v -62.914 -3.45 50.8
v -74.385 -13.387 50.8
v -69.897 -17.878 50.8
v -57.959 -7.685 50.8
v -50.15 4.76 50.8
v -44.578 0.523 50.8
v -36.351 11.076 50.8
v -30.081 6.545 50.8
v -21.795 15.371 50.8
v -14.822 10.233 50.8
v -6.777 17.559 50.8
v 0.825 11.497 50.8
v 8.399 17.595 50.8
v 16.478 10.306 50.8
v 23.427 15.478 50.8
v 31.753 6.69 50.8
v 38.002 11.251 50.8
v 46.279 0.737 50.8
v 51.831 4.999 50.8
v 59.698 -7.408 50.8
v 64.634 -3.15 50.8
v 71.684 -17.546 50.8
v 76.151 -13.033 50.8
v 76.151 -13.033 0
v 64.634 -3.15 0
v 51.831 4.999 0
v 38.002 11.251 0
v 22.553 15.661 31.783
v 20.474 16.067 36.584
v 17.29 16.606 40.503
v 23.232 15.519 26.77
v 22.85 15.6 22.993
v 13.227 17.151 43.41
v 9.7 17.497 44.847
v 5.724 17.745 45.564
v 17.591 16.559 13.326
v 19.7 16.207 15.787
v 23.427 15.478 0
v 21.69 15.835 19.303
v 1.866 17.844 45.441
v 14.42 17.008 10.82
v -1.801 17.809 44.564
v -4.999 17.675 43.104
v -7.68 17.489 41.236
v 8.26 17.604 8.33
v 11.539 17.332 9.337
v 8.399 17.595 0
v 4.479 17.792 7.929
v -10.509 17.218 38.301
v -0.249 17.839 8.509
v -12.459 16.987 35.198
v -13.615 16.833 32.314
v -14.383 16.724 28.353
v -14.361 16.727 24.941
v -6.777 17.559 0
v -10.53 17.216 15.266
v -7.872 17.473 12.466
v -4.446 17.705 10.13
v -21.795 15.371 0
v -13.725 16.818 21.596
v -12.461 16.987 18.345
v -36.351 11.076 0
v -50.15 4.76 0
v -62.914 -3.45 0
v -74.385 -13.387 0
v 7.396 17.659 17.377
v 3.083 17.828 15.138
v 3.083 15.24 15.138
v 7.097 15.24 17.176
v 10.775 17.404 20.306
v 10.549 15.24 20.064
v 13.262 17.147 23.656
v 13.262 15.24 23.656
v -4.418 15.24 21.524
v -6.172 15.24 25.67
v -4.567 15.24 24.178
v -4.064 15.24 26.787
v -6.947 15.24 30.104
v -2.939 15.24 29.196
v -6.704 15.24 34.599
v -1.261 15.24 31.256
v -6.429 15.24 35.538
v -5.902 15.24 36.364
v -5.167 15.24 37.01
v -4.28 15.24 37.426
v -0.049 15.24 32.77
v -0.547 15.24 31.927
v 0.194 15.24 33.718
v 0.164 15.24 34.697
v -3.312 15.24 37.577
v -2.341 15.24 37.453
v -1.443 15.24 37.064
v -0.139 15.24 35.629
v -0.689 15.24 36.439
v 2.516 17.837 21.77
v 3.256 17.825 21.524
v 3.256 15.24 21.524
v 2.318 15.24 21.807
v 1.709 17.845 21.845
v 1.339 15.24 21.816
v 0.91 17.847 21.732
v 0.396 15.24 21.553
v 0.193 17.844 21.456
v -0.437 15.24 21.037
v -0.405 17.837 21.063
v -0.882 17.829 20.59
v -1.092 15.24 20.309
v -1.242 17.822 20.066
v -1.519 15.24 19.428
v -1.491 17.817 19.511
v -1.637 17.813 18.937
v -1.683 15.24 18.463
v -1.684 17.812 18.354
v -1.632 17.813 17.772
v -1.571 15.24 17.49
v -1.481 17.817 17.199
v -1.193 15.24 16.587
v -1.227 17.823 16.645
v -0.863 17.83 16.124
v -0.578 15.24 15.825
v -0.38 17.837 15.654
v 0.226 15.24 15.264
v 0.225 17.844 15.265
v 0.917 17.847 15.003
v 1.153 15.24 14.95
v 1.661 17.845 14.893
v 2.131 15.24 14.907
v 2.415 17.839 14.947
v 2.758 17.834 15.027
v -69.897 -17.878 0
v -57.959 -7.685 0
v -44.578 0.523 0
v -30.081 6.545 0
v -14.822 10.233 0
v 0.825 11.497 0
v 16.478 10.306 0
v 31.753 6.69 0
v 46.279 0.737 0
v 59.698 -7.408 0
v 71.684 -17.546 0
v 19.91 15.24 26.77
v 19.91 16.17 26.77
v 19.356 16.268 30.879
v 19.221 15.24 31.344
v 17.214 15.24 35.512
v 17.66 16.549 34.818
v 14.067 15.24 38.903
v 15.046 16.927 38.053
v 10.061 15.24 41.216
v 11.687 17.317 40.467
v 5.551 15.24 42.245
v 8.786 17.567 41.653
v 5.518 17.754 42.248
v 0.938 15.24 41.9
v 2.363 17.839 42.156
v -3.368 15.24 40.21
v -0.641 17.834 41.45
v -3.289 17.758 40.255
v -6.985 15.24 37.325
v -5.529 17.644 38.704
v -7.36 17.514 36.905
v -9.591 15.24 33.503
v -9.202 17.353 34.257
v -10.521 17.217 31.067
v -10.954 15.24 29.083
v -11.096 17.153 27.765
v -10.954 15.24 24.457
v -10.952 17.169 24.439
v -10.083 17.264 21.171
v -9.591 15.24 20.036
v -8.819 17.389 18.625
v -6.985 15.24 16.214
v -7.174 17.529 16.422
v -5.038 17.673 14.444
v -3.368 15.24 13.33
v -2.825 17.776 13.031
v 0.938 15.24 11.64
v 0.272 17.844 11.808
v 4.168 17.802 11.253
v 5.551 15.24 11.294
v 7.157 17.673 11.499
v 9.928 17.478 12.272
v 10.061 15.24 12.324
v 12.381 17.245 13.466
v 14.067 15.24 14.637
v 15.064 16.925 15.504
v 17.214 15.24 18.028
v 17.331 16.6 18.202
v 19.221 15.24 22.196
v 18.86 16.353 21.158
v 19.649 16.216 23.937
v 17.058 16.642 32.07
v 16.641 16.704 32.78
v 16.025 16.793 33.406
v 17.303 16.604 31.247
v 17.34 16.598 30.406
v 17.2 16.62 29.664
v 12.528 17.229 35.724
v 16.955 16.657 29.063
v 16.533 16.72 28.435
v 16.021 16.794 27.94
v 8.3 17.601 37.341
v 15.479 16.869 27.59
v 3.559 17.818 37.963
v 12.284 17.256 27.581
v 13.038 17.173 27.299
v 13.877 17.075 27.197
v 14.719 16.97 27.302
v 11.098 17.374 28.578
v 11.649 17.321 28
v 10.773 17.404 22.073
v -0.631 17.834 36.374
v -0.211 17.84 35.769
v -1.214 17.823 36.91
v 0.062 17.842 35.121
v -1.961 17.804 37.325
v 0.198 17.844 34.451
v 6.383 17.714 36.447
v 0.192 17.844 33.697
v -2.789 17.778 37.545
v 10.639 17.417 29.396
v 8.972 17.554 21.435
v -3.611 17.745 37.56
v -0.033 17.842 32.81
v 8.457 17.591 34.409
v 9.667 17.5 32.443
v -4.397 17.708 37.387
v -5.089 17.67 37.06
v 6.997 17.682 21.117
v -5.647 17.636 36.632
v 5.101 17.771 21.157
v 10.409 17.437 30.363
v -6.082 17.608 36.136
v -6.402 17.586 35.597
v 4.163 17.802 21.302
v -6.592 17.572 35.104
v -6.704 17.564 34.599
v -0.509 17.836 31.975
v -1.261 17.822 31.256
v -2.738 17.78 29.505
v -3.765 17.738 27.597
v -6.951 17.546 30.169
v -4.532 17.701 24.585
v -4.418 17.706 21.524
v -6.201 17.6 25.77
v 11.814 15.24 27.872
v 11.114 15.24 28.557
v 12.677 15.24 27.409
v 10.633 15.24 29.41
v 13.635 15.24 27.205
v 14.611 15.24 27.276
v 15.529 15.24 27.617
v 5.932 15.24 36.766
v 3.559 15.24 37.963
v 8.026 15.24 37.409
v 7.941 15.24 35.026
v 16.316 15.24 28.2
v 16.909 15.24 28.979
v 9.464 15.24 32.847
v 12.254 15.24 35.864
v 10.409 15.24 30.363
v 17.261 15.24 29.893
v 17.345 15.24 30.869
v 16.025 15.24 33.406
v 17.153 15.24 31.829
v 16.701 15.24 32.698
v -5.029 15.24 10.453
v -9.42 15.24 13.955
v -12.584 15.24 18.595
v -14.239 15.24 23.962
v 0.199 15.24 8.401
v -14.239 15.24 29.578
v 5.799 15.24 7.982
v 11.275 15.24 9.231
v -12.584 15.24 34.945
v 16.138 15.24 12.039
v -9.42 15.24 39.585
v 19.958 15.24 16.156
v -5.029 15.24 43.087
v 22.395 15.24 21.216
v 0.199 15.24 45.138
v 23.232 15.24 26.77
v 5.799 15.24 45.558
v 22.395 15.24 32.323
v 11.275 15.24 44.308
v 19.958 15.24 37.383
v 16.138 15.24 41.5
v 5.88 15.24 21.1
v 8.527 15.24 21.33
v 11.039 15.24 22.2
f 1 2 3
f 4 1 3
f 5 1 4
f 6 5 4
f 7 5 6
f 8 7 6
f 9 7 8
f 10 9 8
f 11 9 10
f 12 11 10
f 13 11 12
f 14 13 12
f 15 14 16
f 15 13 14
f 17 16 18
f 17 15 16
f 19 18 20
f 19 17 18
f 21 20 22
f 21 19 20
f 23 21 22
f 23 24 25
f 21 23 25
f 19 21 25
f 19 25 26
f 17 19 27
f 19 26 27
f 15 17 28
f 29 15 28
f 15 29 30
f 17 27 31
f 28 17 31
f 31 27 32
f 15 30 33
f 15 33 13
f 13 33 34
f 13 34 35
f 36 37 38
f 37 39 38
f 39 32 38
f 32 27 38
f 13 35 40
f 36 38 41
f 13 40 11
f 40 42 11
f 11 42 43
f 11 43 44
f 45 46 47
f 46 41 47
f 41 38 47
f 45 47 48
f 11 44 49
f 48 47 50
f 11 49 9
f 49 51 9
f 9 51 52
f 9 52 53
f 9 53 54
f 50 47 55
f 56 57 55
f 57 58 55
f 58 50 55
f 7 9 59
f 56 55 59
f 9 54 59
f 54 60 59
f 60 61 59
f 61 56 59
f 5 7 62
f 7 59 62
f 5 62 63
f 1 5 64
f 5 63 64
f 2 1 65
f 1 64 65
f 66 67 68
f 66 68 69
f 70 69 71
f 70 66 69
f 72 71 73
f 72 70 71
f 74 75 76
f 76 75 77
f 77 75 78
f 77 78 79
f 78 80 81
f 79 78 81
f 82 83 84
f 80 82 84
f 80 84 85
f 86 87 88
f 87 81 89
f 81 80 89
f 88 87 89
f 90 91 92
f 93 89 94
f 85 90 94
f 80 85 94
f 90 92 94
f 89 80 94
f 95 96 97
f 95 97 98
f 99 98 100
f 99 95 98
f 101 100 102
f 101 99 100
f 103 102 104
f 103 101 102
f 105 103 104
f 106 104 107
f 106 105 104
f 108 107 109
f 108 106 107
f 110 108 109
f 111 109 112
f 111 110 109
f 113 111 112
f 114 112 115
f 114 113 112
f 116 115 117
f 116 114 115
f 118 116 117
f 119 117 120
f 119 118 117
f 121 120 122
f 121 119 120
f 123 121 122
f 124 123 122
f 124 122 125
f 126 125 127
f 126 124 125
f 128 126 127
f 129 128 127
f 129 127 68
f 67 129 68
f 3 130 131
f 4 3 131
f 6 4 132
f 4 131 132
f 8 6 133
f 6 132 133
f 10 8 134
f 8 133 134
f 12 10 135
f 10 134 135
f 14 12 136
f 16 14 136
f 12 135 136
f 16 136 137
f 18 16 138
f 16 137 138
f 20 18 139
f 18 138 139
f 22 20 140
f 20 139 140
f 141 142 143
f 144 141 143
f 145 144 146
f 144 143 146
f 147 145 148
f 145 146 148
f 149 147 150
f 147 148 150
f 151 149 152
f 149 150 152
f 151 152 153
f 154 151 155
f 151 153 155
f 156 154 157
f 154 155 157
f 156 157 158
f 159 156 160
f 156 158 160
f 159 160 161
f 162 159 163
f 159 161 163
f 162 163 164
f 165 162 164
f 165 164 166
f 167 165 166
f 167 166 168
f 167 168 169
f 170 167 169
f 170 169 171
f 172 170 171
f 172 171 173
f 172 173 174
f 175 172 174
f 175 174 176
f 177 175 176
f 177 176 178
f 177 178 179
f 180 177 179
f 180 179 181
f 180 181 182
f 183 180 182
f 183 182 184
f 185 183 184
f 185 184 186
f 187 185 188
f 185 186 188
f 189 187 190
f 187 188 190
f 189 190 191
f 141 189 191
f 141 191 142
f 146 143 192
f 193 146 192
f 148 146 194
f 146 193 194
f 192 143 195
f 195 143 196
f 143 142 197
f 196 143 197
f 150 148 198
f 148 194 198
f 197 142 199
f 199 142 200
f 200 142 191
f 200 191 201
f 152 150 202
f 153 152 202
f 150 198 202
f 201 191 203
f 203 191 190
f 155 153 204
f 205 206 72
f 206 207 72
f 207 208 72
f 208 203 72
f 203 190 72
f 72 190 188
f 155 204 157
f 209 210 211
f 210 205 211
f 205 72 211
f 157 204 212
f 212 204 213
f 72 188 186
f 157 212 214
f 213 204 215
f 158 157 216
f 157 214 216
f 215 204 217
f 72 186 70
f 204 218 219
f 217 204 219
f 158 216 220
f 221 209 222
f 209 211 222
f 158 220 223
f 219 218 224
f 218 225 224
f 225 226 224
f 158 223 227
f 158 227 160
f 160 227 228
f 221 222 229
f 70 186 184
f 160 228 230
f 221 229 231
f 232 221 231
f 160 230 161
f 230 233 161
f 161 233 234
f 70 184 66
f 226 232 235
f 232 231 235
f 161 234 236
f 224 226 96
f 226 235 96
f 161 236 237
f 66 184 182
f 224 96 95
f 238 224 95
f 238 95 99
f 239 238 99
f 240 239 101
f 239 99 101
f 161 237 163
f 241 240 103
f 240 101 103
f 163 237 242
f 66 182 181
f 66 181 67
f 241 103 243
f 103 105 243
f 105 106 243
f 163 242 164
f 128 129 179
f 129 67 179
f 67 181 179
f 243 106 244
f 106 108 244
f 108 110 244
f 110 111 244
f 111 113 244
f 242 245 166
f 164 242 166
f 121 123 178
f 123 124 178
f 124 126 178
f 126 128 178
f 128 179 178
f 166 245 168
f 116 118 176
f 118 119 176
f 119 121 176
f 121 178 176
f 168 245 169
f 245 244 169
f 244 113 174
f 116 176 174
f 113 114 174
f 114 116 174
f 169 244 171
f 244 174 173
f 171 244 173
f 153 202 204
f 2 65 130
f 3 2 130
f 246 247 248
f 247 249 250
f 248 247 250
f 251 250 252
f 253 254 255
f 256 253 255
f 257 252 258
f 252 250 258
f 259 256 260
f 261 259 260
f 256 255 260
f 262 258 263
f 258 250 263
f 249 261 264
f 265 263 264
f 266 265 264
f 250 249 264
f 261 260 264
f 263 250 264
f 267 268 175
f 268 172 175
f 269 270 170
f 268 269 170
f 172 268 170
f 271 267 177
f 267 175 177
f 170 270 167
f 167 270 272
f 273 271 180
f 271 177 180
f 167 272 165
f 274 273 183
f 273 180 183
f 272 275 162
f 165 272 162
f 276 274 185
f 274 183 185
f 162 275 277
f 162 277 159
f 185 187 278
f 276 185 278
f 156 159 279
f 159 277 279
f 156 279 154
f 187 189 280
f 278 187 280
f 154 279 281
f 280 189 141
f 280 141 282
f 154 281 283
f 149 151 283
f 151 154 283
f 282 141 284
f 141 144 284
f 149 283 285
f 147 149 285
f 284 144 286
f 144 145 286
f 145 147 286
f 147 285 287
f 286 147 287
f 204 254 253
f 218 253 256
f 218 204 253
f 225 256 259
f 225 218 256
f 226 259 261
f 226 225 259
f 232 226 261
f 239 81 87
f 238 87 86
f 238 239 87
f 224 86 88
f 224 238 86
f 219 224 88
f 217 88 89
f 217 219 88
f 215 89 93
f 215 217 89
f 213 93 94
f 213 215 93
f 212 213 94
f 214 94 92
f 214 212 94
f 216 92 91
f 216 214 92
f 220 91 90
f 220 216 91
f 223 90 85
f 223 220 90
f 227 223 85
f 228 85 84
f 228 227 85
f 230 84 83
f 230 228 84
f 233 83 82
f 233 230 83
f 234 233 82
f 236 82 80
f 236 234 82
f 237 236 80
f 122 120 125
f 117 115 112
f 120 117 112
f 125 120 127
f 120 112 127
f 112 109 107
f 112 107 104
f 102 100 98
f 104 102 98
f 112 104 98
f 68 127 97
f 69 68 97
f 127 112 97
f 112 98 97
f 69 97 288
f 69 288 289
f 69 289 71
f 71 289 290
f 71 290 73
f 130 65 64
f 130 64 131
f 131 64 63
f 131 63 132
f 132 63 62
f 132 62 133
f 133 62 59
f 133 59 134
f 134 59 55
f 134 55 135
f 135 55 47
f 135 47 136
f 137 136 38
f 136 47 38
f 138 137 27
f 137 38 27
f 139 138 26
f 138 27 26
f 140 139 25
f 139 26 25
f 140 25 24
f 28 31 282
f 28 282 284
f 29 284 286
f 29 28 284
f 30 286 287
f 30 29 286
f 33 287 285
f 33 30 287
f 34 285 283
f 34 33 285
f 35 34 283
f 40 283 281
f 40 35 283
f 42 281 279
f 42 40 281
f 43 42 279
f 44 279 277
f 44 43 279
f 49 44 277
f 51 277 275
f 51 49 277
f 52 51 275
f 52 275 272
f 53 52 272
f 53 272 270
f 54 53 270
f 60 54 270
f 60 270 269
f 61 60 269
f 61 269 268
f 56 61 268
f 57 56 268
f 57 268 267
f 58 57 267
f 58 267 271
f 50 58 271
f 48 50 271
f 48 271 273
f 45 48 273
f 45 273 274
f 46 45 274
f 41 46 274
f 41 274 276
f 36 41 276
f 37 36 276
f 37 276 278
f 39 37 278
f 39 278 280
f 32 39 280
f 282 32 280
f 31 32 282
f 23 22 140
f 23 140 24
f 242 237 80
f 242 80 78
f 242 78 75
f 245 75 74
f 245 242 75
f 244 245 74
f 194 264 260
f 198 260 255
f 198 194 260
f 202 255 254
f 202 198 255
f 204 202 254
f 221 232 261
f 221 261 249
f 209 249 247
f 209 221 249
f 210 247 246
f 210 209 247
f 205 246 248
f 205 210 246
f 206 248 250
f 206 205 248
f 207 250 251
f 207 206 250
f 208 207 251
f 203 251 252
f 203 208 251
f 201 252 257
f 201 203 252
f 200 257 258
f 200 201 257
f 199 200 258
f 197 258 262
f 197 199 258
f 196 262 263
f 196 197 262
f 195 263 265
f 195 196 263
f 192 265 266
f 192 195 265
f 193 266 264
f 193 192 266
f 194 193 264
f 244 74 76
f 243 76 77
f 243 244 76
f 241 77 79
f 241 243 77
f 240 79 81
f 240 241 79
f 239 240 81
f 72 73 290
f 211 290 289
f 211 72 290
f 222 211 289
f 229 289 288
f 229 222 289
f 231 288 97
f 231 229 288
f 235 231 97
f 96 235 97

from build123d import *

# Parameters (mm, degrees)
F1_DEPTH = 50.8
F3_R     = 18.840959
F3_R_2   = 15.518861
F4_DEPTH = 5.08


with BuildPart() as f1:
    # F0 (on Top) → F1 (new body)
    with BuildSketch(Plane.XY):
        with BuildLine():
            Line((71.684018, -17.545537), (76.151238, -13.032617))
            ThreePointArc((76.151238, -13.032617), (0.810028, 17.846849), (-74.385113, -13.386627))
            Line((-74.385113, -13.386627), (-69.896718, -17.878487))
            ThreePointArc((-69.896718, -17.878487), (0.824961, 11.496866), (71.684018, -17.545537))
        make_face()
    extrude(amount=F1_DEPTH)

    # F3 (on offset) → F4 (cut)
    with BuildSketch(Plane.XZ.offset(-20.32)):
        with Locations((4.391287, 26.769793)):
            Circle(F3_R)
        with Locations((4.391287, 26.769793)):
            Circle(F3_R_2, mode=Mode.SUBTRACT)
        with BuildLine():
            ThreePointArc((-4.417794, 21.524068), (-4.064254, 26.78749), (-1.260601, 31.256061))
            ThreePointArc((-1.260601, 31.256061), (-1.442666, 37.063663), (-6.704263, 34.598508))
            ThreePointArc((-6.704263, 34.598508), (-6.685209, 27.864691), (-4.417794, 21.524068))
        make_face()
        with BuildLine():
            ThreePointArc((3.559272, 37.963443), (7.940759, 35.025558), (10.408828, 30.363238))
            ThreePointArc((10.408828, 30.363238), (15.529392, 27.617109), (16.025304, 33.406364))
            ThreePointArc((16.025304, 33.406364), (10.18412, 36.756771), (3.559272, 37.963443))
        make_face()
        with BuildLine():
            ThreePointArc((13.262496, 23.655856), (8.527469, 21.33032), (3.255747, 21.524069))
            ThreePointArc((3.255747, 21.524069), (-1.682752, 18.462594), (3.082934, 15.138495))
            ThreePointArc((3.082934, 15.138495), (8.905063, 18.521906), (13.262496, 23.655856))
        make_face()
    extrude(amount=F4_DEPTH, mode=Mode.SUBTRACT)


solid = f1.part
